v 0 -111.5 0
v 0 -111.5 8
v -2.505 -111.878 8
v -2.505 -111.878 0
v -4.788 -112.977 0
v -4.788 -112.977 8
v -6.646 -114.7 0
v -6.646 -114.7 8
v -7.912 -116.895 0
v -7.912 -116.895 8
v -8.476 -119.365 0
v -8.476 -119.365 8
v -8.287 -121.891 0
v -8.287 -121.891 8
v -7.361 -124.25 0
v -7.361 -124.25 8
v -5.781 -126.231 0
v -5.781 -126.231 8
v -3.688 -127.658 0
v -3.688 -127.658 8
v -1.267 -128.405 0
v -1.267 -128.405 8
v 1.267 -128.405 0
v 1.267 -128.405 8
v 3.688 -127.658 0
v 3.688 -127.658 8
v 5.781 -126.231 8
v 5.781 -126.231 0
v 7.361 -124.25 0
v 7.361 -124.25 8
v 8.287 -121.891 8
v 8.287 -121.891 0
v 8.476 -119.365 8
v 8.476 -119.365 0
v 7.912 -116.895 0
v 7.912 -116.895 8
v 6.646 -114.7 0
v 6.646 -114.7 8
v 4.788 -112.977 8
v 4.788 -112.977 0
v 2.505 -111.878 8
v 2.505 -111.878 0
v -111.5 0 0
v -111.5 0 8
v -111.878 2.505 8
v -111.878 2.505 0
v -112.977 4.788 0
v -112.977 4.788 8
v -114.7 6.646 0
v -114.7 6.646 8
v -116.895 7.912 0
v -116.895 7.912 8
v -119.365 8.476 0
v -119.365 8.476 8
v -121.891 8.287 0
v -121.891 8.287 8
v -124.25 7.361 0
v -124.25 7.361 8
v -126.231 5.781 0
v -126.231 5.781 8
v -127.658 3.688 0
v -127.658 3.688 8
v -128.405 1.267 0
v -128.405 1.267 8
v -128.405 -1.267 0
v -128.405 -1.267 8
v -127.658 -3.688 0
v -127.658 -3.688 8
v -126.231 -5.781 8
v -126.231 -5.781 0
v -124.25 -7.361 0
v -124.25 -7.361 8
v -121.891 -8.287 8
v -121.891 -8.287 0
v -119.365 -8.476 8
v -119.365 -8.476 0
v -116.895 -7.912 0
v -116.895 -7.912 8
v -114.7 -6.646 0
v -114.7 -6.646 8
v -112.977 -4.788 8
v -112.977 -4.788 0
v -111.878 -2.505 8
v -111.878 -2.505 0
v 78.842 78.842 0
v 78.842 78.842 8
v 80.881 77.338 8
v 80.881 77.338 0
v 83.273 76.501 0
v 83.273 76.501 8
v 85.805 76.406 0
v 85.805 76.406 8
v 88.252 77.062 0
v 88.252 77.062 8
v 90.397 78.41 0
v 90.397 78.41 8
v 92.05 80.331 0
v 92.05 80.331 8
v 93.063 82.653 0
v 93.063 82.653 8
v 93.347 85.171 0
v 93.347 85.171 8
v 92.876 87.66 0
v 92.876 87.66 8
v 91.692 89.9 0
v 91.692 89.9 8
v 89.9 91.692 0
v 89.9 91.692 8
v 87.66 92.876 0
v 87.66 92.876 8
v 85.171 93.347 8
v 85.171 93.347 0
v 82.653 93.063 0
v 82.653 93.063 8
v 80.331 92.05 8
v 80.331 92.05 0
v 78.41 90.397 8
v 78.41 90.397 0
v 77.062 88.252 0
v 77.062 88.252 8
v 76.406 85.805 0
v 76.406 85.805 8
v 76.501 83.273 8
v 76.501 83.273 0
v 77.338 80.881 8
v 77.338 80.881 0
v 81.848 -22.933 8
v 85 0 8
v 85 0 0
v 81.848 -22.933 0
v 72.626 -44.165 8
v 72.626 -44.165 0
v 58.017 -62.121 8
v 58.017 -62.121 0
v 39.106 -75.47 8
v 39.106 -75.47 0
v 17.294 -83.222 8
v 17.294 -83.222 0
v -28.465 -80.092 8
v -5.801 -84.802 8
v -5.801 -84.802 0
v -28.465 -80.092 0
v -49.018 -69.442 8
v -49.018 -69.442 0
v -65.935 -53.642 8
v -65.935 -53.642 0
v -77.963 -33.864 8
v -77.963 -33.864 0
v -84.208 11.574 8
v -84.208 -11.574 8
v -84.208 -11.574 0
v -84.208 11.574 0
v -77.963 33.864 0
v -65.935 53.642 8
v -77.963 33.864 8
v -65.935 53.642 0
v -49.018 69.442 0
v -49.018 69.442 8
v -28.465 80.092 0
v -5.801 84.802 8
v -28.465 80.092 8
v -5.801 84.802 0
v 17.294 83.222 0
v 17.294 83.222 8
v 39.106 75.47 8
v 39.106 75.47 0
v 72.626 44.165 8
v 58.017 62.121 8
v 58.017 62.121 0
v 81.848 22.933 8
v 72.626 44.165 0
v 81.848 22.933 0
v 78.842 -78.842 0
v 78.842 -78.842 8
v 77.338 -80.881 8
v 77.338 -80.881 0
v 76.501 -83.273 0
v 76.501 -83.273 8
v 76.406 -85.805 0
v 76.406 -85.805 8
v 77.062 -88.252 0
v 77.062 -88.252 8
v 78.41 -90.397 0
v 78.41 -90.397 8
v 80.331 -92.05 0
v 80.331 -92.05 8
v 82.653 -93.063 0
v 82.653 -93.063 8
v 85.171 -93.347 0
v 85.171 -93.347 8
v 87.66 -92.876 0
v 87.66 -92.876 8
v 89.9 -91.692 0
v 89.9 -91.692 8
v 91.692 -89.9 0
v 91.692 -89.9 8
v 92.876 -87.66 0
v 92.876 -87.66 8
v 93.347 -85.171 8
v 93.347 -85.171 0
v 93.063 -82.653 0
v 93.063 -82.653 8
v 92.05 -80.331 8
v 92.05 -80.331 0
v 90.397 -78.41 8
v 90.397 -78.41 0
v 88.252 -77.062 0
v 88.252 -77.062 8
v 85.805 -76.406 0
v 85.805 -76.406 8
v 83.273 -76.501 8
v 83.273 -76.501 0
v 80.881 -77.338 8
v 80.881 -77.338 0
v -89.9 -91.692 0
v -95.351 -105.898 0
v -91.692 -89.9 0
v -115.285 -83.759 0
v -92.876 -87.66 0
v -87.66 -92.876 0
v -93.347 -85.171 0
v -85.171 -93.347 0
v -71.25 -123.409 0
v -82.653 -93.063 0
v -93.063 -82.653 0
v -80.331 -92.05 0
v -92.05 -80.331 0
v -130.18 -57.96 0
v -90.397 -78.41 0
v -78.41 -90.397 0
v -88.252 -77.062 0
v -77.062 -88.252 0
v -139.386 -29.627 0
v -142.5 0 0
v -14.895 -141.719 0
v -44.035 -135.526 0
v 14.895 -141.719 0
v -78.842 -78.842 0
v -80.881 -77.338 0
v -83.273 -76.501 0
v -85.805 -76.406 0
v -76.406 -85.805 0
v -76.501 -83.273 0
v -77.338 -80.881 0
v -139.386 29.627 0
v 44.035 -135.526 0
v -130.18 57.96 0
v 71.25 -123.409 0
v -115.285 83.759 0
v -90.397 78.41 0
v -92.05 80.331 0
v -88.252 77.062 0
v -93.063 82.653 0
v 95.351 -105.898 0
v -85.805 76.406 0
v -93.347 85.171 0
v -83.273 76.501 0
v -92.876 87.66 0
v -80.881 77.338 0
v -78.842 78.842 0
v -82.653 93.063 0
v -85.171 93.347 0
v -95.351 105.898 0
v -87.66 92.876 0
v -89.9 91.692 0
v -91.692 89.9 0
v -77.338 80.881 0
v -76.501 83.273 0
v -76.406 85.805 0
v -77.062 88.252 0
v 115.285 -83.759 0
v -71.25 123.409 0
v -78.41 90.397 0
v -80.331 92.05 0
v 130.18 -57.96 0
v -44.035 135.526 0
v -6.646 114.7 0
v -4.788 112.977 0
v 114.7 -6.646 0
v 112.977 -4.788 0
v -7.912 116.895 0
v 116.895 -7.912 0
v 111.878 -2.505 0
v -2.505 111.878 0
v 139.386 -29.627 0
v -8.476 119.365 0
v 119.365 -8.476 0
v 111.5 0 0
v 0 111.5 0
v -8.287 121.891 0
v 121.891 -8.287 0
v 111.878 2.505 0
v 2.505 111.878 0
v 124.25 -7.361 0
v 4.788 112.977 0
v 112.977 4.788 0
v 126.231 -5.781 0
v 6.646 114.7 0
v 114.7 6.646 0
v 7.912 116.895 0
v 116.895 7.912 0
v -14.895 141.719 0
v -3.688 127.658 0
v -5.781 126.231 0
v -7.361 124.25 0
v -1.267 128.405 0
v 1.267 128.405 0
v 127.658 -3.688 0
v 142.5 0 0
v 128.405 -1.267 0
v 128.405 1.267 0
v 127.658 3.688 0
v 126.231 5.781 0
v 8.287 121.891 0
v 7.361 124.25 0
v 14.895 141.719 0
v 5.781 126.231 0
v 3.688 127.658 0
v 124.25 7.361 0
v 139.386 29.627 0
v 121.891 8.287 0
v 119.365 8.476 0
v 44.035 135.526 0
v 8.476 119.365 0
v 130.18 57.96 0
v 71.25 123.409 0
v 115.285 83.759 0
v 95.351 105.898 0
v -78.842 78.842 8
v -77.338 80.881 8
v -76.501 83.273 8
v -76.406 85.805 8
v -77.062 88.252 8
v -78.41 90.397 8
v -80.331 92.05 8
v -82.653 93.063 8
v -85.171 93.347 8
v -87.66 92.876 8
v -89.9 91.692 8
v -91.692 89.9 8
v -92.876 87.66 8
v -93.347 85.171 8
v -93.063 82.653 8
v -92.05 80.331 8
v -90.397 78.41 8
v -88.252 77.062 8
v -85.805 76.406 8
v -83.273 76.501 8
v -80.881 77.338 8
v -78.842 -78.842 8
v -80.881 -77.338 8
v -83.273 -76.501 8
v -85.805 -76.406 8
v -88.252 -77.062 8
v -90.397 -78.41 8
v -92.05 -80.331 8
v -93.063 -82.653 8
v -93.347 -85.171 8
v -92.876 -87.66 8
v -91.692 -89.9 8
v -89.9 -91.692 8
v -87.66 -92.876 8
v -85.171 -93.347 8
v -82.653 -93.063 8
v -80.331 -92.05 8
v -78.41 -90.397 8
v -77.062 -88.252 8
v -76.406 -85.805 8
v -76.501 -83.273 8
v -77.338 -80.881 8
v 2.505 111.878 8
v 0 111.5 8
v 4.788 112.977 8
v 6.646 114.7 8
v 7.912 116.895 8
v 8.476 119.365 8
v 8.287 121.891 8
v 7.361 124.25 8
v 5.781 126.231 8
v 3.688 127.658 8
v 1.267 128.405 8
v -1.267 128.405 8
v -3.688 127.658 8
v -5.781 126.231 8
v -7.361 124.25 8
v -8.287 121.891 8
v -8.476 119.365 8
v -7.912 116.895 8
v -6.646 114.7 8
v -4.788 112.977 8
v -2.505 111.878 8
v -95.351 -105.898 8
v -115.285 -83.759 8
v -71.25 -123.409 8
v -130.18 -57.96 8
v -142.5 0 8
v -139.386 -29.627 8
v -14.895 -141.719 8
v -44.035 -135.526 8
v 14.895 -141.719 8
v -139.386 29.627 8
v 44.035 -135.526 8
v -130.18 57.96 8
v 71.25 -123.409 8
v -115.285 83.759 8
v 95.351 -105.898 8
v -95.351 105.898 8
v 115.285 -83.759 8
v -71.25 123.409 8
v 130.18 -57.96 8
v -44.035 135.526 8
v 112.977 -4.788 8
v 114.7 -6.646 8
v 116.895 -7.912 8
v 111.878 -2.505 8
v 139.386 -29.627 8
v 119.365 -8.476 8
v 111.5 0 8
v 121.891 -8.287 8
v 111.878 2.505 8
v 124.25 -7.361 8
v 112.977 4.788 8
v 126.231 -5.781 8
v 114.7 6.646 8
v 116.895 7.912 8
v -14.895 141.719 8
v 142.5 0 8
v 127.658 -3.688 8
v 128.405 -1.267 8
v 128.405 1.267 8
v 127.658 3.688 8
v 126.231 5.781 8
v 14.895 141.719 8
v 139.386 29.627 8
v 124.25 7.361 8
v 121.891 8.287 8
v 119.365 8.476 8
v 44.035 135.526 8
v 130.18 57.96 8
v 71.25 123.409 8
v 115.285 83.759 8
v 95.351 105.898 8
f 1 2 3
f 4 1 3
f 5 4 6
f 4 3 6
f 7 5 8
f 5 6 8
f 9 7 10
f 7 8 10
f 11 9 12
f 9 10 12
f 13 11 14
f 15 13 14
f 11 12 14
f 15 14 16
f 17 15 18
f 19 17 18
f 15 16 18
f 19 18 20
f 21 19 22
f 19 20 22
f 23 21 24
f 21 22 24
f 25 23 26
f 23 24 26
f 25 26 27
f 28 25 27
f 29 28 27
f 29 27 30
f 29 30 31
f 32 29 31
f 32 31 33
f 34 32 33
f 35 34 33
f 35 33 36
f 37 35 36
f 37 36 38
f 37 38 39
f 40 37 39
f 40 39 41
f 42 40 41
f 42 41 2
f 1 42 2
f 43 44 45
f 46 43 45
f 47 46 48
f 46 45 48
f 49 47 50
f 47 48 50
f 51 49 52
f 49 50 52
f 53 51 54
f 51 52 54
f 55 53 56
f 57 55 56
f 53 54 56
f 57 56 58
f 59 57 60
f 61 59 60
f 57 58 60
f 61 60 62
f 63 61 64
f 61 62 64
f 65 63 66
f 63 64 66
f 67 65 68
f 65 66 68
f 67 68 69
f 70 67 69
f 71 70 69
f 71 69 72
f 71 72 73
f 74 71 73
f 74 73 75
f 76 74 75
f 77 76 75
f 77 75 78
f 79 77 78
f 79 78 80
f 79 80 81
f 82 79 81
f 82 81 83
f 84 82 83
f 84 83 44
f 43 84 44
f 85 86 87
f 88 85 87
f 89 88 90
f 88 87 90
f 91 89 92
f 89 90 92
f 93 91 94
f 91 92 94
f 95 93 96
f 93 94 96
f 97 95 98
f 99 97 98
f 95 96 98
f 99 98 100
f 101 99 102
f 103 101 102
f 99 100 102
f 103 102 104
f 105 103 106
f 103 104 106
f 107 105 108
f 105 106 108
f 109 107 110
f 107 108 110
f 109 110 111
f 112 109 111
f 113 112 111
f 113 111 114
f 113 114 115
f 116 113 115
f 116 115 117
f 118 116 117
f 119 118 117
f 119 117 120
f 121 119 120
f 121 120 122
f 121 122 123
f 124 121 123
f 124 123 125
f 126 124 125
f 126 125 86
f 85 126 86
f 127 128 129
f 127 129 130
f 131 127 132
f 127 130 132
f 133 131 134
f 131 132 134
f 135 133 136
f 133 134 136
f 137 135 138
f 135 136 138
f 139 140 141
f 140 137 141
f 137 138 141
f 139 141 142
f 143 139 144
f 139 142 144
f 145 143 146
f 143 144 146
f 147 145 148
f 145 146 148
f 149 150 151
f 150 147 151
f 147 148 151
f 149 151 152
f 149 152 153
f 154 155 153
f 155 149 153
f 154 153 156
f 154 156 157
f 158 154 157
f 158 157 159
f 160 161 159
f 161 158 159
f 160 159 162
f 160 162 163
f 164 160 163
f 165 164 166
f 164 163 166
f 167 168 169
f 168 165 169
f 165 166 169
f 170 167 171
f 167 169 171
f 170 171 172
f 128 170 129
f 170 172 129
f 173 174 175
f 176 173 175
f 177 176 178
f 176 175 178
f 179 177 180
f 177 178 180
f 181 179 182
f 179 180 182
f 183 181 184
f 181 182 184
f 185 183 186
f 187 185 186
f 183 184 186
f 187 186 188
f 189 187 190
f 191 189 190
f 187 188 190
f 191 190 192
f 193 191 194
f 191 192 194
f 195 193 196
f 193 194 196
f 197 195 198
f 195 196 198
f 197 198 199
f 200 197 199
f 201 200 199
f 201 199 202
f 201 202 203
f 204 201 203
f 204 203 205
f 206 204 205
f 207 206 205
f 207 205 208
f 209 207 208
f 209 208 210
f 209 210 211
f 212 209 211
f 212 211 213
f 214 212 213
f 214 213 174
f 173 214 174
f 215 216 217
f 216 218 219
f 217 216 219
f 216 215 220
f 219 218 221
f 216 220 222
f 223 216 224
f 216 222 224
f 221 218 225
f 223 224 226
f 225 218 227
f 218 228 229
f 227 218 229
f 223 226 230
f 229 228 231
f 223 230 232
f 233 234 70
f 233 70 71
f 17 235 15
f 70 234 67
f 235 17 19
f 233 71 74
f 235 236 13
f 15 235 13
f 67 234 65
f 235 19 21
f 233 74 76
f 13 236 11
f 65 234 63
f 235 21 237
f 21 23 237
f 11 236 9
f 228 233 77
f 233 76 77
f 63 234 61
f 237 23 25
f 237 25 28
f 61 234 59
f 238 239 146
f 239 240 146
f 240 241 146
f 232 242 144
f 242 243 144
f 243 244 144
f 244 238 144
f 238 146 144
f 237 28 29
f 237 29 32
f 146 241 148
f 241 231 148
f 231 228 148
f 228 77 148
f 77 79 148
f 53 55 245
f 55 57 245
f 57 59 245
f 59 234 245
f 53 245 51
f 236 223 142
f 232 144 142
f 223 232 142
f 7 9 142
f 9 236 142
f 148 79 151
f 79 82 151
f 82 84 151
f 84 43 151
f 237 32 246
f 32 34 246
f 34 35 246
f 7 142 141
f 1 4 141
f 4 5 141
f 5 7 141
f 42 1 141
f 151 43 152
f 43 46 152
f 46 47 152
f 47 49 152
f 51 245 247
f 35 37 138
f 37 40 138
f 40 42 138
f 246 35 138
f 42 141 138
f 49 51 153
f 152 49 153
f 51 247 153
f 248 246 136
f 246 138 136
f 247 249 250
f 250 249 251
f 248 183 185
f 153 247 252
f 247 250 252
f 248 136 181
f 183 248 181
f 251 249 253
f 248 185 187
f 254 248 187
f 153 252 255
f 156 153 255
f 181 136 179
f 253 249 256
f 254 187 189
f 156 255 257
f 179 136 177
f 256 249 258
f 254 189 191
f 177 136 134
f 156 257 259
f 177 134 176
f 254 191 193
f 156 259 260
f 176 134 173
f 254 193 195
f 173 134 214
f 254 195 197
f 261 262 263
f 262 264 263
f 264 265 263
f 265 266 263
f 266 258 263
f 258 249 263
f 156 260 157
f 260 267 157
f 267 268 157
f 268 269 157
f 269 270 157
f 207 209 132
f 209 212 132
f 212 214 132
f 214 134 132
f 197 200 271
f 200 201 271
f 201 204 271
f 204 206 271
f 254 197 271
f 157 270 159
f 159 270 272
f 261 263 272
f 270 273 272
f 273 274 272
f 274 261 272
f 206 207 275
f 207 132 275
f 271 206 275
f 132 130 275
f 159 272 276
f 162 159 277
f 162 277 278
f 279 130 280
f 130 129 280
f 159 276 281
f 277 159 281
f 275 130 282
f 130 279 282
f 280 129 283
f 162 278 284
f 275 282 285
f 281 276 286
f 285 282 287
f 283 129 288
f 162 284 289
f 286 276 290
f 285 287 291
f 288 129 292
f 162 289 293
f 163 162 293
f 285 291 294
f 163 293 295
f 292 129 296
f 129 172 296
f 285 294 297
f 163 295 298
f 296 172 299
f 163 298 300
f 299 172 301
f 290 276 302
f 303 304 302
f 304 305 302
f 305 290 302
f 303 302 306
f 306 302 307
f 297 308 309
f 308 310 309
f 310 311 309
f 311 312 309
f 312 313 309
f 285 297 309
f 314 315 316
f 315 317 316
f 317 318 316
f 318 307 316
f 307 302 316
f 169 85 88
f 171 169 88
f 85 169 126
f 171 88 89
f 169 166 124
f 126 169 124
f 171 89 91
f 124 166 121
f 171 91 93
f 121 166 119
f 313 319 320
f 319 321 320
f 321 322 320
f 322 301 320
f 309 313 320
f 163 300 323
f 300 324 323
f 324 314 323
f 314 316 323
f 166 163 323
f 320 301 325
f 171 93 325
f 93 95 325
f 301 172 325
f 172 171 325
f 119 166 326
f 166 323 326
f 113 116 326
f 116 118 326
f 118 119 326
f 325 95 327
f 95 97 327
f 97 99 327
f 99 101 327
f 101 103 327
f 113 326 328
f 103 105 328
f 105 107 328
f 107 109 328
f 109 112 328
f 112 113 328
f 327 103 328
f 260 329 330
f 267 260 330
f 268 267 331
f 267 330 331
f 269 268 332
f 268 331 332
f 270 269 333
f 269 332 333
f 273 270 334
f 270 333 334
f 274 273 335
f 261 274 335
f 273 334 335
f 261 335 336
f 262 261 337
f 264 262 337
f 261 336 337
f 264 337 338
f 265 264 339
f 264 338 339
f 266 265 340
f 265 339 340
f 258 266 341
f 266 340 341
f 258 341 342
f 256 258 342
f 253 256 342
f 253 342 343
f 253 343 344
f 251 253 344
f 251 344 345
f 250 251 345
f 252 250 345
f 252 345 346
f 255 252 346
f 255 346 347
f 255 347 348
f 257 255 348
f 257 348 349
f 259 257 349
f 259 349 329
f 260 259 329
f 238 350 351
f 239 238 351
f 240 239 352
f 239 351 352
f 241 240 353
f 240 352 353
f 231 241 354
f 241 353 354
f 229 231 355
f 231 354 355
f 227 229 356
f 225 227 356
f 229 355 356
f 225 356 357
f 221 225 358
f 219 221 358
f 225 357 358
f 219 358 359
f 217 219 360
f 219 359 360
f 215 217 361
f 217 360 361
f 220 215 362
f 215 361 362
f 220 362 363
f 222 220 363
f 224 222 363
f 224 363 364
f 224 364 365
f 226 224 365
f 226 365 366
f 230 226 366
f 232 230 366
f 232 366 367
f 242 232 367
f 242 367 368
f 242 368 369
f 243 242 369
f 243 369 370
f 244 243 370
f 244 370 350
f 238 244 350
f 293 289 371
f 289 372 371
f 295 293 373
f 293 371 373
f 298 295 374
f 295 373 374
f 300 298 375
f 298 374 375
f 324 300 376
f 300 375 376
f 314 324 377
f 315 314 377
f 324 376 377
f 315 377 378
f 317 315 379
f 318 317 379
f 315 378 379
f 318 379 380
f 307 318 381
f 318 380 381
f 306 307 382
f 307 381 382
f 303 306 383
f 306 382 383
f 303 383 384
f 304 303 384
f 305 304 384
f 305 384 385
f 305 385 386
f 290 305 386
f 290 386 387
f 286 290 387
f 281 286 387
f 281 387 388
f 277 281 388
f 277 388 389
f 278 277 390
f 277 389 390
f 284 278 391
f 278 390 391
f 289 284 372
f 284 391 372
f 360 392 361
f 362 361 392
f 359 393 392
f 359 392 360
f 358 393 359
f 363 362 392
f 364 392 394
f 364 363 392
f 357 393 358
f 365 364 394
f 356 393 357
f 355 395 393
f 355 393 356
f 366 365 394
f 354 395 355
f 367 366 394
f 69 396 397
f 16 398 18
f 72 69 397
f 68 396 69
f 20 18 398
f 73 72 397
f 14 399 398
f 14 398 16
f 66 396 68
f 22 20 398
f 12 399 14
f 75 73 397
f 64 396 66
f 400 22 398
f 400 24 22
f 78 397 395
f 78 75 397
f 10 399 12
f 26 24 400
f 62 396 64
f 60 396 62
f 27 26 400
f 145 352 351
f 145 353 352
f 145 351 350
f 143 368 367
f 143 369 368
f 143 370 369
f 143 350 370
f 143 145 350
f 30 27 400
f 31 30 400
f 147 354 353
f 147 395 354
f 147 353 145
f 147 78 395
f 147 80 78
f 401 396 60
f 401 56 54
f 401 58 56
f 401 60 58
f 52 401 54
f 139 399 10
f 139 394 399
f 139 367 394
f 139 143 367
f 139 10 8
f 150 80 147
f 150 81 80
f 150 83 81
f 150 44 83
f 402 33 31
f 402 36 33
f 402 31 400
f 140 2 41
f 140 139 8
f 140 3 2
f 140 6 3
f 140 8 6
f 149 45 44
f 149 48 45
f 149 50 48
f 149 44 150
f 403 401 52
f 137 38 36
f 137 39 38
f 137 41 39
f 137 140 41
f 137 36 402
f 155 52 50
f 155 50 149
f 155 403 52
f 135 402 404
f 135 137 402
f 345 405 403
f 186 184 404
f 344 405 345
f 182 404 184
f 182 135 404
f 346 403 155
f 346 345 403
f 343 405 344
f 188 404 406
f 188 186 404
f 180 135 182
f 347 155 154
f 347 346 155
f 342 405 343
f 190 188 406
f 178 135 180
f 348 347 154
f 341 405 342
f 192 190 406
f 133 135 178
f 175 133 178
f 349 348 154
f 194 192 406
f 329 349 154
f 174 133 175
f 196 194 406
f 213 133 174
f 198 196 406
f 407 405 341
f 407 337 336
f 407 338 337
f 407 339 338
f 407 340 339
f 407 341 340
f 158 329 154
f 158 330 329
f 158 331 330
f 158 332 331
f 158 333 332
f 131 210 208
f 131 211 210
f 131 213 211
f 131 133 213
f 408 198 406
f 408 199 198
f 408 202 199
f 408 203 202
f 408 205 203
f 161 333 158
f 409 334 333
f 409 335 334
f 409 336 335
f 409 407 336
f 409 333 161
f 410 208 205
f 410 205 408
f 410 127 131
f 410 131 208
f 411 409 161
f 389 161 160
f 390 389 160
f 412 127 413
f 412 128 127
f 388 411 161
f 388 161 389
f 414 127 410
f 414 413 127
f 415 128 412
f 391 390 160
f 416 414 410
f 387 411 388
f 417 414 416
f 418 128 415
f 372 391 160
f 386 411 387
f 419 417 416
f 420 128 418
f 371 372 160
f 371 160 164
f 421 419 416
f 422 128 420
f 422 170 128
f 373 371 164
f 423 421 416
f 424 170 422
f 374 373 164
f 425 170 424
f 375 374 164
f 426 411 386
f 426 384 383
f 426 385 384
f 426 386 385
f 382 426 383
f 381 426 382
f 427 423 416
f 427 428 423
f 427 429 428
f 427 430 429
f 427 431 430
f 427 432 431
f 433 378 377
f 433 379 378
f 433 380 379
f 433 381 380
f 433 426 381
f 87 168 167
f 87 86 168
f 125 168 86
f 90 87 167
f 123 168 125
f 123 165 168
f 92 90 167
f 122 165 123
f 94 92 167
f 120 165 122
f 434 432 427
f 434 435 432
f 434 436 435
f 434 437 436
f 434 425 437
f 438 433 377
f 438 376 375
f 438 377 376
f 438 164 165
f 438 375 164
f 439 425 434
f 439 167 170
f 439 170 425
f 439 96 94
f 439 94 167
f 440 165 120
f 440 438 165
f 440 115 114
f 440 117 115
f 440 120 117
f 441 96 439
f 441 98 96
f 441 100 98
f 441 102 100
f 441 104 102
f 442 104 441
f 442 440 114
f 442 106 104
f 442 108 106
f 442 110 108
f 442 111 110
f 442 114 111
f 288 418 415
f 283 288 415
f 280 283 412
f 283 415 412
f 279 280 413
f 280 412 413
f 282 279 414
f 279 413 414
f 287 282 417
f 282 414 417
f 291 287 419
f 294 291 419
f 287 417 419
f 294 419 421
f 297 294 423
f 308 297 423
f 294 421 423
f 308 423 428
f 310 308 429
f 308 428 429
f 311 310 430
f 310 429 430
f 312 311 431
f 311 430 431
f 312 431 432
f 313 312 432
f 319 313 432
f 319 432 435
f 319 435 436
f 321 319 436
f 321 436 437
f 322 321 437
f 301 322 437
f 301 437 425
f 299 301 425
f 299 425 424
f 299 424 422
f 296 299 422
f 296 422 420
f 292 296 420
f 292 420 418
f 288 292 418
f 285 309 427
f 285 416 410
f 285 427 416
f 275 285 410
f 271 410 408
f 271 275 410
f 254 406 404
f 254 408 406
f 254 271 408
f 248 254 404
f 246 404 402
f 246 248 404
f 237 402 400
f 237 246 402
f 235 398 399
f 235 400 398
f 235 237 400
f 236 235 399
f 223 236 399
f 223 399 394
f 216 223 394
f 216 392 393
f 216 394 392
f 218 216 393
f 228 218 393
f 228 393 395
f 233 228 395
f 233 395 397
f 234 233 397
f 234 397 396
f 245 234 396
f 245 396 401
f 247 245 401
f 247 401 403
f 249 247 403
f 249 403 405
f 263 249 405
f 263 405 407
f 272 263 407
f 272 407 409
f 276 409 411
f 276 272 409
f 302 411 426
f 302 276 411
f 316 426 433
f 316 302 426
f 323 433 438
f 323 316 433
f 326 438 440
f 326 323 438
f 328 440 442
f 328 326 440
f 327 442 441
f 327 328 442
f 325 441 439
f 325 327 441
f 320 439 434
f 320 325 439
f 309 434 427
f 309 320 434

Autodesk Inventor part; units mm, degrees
ref_plane "YZ Plane" through (0, 0, 0) normal (1, 0, 0) x (0, 1, 0)
ref_plane "XZ Plane" through (0, 0, 0) normal (0, 1, 0) x (-1, 0, 0)
ref_plane "XY Plane" through (0, 0, 0) normal (0, 0, 1) x (1, 0, 0)
sketch "Sketch2" plane through (0, 0, 0) normal (0, 0, 1) x (1, 0, 0)
  circle A0 centre (0, 0) radius 85
  circle A1 centre (0, 0) radius 142.5
  dimension "d25" = 170
  dimension "d27" = 285
extrude "Plate2" add sketch "Sketch2" along normal blind 8
sketch "Sketch3" plane through (0, 0, 8) normal (0, 0, 1) x (1, 0, 0)
  circle A0 centre (-120, 0) radius 8.5
  circle A1 centre (0, 0) radius 120 construction
  dimension "d28" = 240
  dimension "d15" = 17
extrude "Cut1" cut sketch "Sketch3" against normal blind 8
pattern_circular "Circular Pattern1" count 8 over 360 about axis through (0, 0, 0) along (0, 0, 1) of "Cut1"
equation "\"d17\" = Thickness"
equation "\"d14\" = Thickness"
equation "\"BendReliefWidth\" = Thickness"
equation "\"BendReliefDepth\" = 0.5 * Thickness"
equation "\"CornerReliefSize\" = 4 * Thickness"
equation "\"MinimumRemnant\" = 2 * Thickness"
equation "\"TransitionRadius\" = BendRadius"
equation "\"JacobiRadiusSize\" = BendRadius"
equation "\"GapSize\" = Thickness"
equation "\"Thickness\" = 8"
equation "\"BendRadius\" = 6"
properties part number "PNS-733 charging flange round" material "Steel"
